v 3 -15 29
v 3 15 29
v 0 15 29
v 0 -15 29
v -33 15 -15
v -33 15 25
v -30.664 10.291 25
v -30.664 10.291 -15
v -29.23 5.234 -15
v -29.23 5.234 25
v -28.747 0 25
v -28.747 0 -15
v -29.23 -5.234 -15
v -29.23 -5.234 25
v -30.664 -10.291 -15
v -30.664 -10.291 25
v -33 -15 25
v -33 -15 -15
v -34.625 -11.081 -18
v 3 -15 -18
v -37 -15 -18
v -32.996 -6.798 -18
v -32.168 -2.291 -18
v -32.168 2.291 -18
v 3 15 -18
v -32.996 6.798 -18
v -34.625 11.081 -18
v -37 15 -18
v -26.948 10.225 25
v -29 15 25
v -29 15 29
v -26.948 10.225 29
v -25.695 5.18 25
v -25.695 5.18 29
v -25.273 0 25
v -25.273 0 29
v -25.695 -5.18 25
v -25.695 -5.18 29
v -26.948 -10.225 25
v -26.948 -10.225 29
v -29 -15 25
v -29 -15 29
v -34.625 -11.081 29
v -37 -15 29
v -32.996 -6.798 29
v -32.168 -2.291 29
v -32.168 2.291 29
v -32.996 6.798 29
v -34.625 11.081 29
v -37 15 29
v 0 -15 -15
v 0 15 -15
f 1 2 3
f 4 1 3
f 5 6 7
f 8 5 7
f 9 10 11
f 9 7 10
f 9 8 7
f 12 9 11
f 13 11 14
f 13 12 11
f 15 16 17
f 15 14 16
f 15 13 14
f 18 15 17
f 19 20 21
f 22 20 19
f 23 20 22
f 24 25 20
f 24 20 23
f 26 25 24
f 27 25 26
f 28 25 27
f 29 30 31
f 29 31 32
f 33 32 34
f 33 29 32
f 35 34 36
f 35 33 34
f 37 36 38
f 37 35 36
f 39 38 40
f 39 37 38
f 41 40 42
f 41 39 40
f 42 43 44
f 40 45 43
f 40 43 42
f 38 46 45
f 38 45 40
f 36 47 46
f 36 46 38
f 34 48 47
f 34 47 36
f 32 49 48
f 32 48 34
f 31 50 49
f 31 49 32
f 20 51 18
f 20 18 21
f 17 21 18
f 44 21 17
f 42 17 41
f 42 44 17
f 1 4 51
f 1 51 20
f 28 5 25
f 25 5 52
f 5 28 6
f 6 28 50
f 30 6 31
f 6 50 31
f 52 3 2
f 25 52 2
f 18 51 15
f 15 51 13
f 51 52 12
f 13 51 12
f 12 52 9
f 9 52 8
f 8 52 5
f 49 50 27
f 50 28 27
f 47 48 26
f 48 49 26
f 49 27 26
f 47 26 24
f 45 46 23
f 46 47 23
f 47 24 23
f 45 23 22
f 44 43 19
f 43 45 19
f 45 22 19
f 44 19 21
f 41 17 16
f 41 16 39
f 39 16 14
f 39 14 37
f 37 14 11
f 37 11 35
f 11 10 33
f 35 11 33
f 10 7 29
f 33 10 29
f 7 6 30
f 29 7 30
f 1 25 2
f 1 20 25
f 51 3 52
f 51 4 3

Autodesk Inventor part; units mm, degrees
ref_plane "YZ Plane" through (0, 0, 0) normal (1, 0, 0) x (0, 1, 0)
ref_plane "XZ Plane" through (0, 0, 0) normal (0, 1, 0) x (-1, 0, 0)
ref_plane "XY Plane" through (0, 0, 0) normal (0, 0, 1) x (1, 0, 0)
sketch "Sketch1" plane through (0, 0, 0) normal (1, 0, 0) x (0, 1, 0)
  line L0 (-15, -15) -> (15, -15)
  line L1 (15, -15) -> (15, 15)
  line L2 (15, 15) -> (-15, 15)
  line L3 (-15, 15) -> (-15, -15)
  line L4 (-15, -15) -> (15, 15) construction
  line L5 (15, -15) -> (-15, 15) construction
  point P0 (0, 0)
  dimension "d0" = 30
  dimension "d1" = 30
extrude "Extrusion1" add sketch "Sketch1" along normal blind 3
sketch "Sketch2" plane through (0, -15, -15) normal (0, 0, -1) x (-1, 0, 0)
  line L0 (0, 30) -> (-3, 30) projected
  line L1 (-3, 30) -> (37, 30)
  line L2 (37, 30) -> (37, 0)
  line L3 (37, 0) -> (-3, 0)
  line L4 (-3, 0) -> (-3, 30)
  point P0 (0, 15)
  dimension "d4" = 40
  dimension "d5" = 30
extrude "Extrusion2" add sketch "Sketch2" along normal blind 3
sketch "Sketch3" plane through (0, -15, -15) normal (0, 0, 1) x (1, 0, 0)
  line L0 (0, 0) -> (-37, 0) projected
  line L1 (-37, 0) -> (-37, 30) projected
  arc A0 (-37, 0) -> (-37, 30) centre (-57.325, 15) ccw
  point P0 (0, 15)
extrude "Extrusion3" cut sketch "Sketch3" against normal blind 3
sketch "Sketch4" plane through (0, -15, -15) normal (0, 0, 1) x (1, 0, 0)
  line L0 (-37, 30) -> (0, 30) projected
  arc A0 (-37, 0) -> (-37, 30) centre (-57.325, 15) ccw projected
  line L1 (-33.6755, 30) -> (-37, 30)
  point P0 (0, 15)
sketch "Sketch5" plane through (0, -15, -15) normal (0, 0, 1) x (1, 0, 0)
  arc A0 (-37, 0) -> (-37, 30) centre (-57.325, 15) ccw projected
  line L0 (-37, 30) -> (-33, 30)
  line L1 (-37, 30) -> (0, 30) projected
  line L2 (0, 0) -> (-37, 0) projected
  arc A1 (-33, 0) -> (-33, 30) centre (-57.325, 15) ccw
  line L3 (-33, 0) -> (-37, 0)
  arc A2 (-37, 0) -> (-37, 30) centre (-57.325, 15) ccw
  point P0 (0, 15)
  dimension "d10" = 4
extrude "Extrusion4" add sketch "Sketch5" along normal blind 40
sketch "Sketch6" plane through (0, -15, 25) normal (0, 0, 1) x (1, 0, 0)
  line L0 (-33, 30) -> (-37, 30) projected
  line L1 (-37, 30) -> (-29, 30)
  arc A0 (-37, 0) -> (-37, 30) centre (-57.325, 15) ccw projected
  line L2 (-37, 0) -> (-29, 0)
  arc A1 (-29, 0) -> (-29, 30) centre (-57.325, 15) ccw
  arc A2 (-37, 0) -> (-37, 30) centre (-57.325, 15) ccw
  point P0 (0, 15)
  dimension "d13" = 8
extrude "Extrusion5" add sketch "Sketch6" along normal blind 4
sketch "Sketch7" plane through (0, -15, 15) normal (0, -1, 0) x (1, 0, 0)
  point P0 (0, -15)
sketch "Sketch8" plane through (0, -15, 15) normal (0, 0, 1) x (1, 0, 0)
  point P0 (0, 15)
sketch "Sketch9" plane through (0, -15, 15) normal (0, -1, 0) x (1, 0, 0)
  line L0 (3, 0) -> (3, -33) projected
  line L1 (3, 0) -> (3, 14)
  line L2 (3, 14) -> (0, 14)
  line L3 (0, 0) -> (3, 0) projected
  line L4 (0, 14) -> (0, 0)
  line L5 (0, 0) -> (3, 0)
  point P0 (0, -15)
  dimension "d16" = 14
extrude "Extrusion6" add sketch "Sketch9" against normal blind 30
sketch "Sketch10" plane through (0, 0, 0) normal (-1, 0, 0) x (0, 0, 1)
  point P0 (0, 0)
properties part number "headphones_hookl"
